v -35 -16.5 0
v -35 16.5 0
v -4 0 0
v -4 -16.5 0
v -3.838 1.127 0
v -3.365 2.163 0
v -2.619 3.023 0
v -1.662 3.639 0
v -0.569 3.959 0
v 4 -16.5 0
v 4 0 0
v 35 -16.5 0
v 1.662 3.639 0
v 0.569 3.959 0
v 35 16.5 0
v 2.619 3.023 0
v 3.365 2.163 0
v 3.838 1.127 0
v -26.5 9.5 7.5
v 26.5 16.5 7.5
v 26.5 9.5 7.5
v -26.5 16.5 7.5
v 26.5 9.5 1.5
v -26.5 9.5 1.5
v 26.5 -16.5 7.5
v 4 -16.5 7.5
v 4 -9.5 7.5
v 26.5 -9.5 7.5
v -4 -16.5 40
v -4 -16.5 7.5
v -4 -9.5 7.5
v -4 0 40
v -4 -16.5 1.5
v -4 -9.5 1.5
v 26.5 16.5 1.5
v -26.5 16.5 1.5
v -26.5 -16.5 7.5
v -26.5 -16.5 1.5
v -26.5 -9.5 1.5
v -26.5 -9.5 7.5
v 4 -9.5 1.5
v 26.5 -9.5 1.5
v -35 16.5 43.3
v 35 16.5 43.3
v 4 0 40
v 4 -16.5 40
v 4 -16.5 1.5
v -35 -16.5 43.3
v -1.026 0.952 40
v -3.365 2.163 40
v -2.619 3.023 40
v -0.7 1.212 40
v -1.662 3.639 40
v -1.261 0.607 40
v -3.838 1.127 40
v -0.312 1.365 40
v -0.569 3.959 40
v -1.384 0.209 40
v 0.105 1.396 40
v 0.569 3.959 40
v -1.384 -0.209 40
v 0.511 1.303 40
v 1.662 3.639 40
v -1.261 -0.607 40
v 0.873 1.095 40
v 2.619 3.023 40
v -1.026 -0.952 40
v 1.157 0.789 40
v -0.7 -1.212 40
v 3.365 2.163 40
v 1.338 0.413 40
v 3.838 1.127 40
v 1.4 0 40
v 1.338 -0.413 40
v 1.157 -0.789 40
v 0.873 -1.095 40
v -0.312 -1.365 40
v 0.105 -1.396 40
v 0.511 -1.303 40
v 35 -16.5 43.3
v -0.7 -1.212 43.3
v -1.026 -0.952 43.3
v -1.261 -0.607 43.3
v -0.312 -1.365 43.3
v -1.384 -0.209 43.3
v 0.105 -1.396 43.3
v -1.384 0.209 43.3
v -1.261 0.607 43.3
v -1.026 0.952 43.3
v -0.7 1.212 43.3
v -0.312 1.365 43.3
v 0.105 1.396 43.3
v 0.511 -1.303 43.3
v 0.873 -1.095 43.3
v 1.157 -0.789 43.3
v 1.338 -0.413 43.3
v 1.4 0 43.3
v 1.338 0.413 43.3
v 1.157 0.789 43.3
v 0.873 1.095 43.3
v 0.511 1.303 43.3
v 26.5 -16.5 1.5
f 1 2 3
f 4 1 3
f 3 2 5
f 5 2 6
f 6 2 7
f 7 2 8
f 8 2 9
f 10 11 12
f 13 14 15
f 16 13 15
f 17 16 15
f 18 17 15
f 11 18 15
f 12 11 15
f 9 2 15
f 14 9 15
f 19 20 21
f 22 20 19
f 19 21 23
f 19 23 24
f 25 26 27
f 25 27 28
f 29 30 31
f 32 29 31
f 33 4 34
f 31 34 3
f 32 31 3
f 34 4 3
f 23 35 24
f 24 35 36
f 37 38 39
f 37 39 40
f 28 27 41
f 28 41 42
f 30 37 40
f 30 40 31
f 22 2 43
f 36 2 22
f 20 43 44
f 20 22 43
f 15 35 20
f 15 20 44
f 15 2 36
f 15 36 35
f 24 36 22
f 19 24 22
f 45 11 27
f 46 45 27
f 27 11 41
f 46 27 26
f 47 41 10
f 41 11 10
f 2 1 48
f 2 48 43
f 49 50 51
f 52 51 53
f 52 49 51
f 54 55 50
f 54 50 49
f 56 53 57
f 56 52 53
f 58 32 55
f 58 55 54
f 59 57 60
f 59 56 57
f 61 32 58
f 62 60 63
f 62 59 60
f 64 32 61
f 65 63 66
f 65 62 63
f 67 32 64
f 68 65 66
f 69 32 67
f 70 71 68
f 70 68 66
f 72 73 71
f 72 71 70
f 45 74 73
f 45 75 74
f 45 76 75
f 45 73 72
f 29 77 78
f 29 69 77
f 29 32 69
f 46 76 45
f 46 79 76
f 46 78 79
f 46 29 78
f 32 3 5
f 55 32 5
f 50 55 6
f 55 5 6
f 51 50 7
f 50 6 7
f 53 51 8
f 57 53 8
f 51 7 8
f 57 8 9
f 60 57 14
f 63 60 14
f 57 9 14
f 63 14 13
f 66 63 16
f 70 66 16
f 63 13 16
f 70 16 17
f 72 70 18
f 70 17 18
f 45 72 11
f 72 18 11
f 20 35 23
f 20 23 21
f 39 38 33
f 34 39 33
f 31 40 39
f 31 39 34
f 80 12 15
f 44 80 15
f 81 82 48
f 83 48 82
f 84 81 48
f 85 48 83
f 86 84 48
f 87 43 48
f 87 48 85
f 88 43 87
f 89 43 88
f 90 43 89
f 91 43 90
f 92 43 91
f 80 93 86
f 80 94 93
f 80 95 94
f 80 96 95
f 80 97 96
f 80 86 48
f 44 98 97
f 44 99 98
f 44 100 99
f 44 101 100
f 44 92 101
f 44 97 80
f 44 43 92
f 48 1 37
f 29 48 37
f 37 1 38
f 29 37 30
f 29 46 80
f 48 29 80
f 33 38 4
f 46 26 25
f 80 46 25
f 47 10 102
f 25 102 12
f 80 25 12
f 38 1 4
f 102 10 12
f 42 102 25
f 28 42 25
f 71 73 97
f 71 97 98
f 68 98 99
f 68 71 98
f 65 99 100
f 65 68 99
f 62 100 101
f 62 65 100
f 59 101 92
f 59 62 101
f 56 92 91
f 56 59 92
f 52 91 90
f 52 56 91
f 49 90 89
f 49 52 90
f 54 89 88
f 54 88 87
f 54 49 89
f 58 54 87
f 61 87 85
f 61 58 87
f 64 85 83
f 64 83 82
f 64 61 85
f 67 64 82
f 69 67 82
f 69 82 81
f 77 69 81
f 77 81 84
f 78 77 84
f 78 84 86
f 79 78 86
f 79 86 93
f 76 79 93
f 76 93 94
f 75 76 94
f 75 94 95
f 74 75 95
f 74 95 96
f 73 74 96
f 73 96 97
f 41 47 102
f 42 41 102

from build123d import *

# Parameters (mm, degrees)
F0_W     = 70
F0_H     = 33
F0_R     = 1.4
F1_DEPTH = 43.3
F3_DEPTH = 40
F4_W     = 53
F4_H     = 6
F5_DEPTH = 7
F6_W     = 53
F6_H     = 6
F7_DEPTH = 7


with BuildPart() as f1:
    # F0 (on Top) → F1 (new body)
    with BuildSketch(Plane.XY):
        Rectangle(F0_W, F0_H)
        Circle(F0_R, mode=Mode.SUBTRACT)
    extrude(amount=F1_DEPTH)

    # F2 (on face) → F3 (cut)
    with BuildSketch(Plane(origin=(0, 0, 0), x_dir=(1, 0, 0), z_dir=(0, 0, -1))):
        with BuildLine():
            Line((4, 18.442246), (-4, 18.442246))
            Line((-4, 18.442246), (-4, 0))
            ThreePointArc((-4, 0), (0, -4), (4, 0))
            Line((4, 0), (4, 18.442246))
        make_face()
    extrude(amount=-F3_DEPTH, mode=Mode.SUBTRACT)

    # F4 (on face) → F5 (cut)
    with BuildSketch(Plane.XZ.offset(16.5)):
        with Locations((0, 4.5)):
            Rectangle(F4_W, F4_H)
    extrude(amount=-F5_DEPTH, mode=Mode.SUBTRACT)

    # F6 (on face) → F7 (cut)
    with BuildSketch(Plane(origin=(0, 16.5, 0), x_dir=(-1, 0, 0), z_dir=(0, 1, 0))):
        with Locations((0, 4.5)):
            Rectangle(F6_W, F6_H)
    extrude(amount=-F7_DEPTH, mode=Mode.SUBTRACT)


solid = f1.part
